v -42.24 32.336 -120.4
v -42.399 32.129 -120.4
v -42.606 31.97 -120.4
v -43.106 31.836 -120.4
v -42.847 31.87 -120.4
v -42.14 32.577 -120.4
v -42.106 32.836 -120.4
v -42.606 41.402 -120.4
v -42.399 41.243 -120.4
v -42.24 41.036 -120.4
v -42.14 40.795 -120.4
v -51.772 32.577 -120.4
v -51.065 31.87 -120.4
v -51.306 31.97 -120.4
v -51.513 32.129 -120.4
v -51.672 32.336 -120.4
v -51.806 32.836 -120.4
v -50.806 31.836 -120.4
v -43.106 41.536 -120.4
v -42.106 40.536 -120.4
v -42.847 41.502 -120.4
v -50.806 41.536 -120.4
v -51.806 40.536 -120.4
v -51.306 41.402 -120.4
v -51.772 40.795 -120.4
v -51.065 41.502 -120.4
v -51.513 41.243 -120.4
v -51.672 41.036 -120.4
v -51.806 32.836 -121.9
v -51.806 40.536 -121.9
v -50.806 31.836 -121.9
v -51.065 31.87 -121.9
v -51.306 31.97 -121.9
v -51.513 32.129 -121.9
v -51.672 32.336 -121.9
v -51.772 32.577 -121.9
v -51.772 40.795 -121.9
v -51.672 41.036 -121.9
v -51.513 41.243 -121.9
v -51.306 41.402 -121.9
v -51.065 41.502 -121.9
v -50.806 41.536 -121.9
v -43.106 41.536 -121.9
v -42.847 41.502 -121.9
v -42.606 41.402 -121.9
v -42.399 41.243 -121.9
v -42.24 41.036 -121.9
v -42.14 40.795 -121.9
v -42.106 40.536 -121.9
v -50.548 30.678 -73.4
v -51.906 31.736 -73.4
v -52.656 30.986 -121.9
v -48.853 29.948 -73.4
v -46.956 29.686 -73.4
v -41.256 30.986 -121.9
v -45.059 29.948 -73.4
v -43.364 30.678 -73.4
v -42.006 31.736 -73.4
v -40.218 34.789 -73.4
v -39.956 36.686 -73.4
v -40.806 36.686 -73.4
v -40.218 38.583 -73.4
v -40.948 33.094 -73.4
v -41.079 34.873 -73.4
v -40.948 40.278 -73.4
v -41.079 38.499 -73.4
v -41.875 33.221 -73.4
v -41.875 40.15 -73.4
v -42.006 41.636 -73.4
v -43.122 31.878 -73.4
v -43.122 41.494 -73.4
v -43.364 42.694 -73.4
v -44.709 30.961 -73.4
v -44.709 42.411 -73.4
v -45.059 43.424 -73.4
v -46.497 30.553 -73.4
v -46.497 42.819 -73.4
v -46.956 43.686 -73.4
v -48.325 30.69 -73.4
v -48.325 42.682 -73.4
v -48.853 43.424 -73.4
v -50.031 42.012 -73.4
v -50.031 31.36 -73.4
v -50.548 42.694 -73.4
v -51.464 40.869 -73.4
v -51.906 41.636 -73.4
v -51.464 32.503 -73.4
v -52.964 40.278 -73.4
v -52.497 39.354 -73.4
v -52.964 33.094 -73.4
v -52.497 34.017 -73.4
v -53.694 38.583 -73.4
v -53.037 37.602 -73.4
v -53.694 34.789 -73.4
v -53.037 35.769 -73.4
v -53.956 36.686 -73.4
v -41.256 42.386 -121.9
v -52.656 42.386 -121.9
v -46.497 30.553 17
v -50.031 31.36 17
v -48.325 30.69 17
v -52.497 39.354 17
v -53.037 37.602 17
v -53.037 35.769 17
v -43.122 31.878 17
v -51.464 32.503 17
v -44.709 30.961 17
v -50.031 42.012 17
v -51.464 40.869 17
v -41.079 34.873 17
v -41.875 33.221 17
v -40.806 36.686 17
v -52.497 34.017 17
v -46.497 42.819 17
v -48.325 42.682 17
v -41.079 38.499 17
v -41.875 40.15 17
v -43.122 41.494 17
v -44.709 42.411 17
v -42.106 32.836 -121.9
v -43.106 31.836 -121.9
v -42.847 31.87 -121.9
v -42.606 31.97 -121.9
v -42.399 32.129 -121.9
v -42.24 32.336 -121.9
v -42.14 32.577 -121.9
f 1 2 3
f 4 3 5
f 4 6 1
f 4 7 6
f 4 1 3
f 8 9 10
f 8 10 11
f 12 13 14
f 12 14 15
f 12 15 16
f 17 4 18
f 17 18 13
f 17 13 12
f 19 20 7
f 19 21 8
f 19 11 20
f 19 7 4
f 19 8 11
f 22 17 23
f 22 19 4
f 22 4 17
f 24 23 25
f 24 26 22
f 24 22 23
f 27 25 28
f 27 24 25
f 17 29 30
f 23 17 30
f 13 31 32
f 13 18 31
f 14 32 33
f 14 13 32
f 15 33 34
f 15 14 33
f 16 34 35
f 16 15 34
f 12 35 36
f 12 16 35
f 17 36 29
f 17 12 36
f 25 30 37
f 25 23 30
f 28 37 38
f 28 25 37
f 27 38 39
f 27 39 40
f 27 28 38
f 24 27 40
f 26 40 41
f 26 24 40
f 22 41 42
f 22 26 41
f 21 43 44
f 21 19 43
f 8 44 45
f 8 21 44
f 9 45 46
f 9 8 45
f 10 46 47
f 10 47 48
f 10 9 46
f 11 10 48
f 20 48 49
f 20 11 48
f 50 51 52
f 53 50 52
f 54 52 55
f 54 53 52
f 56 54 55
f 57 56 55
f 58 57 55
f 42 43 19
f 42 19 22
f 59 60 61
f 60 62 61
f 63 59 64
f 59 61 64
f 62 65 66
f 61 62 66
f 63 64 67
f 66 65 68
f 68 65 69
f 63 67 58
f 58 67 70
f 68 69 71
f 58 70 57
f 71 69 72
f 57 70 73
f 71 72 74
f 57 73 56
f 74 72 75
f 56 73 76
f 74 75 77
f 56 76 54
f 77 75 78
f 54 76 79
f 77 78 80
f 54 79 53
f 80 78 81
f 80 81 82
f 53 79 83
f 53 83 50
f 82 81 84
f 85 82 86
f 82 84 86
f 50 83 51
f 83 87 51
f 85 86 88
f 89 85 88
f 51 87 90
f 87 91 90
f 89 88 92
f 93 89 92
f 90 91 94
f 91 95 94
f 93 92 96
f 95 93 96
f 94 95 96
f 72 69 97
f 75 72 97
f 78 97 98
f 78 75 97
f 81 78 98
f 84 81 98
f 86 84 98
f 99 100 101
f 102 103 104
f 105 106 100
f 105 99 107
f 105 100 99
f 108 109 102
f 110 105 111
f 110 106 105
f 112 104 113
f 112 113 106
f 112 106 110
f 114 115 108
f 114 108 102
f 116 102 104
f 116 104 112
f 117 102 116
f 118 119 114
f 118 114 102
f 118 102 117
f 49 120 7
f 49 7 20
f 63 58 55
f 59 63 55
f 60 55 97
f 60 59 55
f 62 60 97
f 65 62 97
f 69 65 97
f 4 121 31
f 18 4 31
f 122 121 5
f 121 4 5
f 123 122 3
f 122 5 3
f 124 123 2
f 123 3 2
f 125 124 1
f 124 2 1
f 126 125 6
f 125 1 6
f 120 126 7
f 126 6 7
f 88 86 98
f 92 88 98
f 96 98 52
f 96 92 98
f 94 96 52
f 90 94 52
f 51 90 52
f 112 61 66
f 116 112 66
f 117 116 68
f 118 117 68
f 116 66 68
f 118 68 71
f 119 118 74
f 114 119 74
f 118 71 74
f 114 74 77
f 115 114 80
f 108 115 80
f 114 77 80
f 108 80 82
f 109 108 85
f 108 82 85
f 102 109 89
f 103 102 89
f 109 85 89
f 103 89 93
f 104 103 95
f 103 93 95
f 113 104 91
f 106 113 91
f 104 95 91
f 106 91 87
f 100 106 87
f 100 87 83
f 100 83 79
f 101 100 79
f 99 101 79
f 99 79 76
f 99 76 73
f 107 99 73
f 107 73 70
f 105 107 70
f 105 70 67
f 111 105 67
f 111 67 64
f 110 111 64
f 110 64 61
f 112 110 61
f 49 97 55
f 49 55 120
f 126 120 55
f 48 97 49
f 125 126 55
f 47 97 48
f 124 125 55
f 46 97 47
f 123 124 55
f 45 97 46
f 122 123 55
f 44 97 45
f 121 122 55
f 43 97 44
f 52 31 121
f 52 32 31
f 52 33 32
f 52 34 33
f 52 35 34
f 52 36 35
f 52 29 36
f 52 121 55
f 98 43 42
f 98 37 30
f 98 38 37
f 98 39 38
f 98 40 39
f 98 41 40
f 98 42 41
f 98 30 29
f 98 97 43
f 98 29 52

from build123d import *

# Parameters (mm, degrees)
SKETCH1_R           = 6.15
BOSS_EXTRUDE1_DEPTH = 17
BOSS_EXTRUDE2_START = -73.4
SKETCH1_2_R         = 6.15
BOSS_EXTRUDE2_DEPTH = 73.4
SKETCH4_W           = 9.7
SKETCH4_H           = 9.7
CUT_EXTRUDE1_DEPTH  = 1.5
FILLET1_R           = 1


with BuildPart() as part:
    # Sketch1 → Boss-Extrude1 (new body)
    with BuildSketch(Plane.XY):
        with Locations((-46.956139987, 36.685790659)):
            Circle(SKETCH1_R)
    extrude(amount=BOSS_EXTRUDE1_DEPTH)

    # Sketch1<2> → Boss-Extrude2 (add)
    with BuildSketch(Plane.XY.offset(BOSS_EXTRUDE2_START)):
        with Locations((-46.956139987, 36.685790659)):
            Circle(SKETCH1_2_R)
    extrude(amount=BOSS_EXTRUDE2_DEPTH)

    # Sketch3 → Loft1 section 0
    with BuildSketch(Plane(origin=(0, 0, -121.9), x_dir=(-1, 0, 0), z_dir=(0, 0, -1))):
        with BuildLine():
            Line((41.256139987, 42.385790659), (52.656139987, 42.385790659))
            Line((52.656139987, 42.385790659), (52.656139987, 30.985790659))
            Line((52.656139987, 30.985790659), (41.256139987, 30.985790659))
            Line((41.256139987, 30.985790659), (41.256139987, 42.385790659))
        make_face()
    # Sketch2 for Loft1 → Loft1 section 1
    with BuildSketch(Plane(origin=(0, 0, -73.4), x_dir=(-1, 0, 0), z_dir=(0, 0, -1))):
        with BuildLine():
            # circular arc as an exact rational Bezier (weights 1, cos(half-angle), 1)
            Bezier((42.006392519, 41.635538128), (46.956139988, 46.585285594), (51.905887456, 41.635538128), weights=[1, 0.707106781, 1])
            Bezier((51.905887456, 41.635538128), (56.855634922, 36.68579066), (51.905887456, 31.736043191), weights=[1, 0.707106781, 1])
            Bezier((51.905887456, 31.736043191), (46.956139987, 26.786295722), (42.006392519, 31.736043191), weights=[1, 0.707106781, 1])
            Bezier((42.006392519, 31.736043191), (37.05664505, 36.685790659), (42.006392519, 41.635538128), weights=[1, 0.707106781, 1])
        make_face()
    loft()

    # Sketch4 → Cut-Extrude1 (cut)
    with BuildSketch(Plane(origin=(0, 0, -121.9), x_dir=(-1, 0, 0), z_dir=(0, 0, -1))):
        with Locations((46.956139987, 36.685790659)):
            Rectangle(SKETCH4_W, SKETCH4_H)
    extrude(amount=-CUT_EXTRUDE1_DEPTH, mode=Mode.SUBTRACT)

    # Fillet1
    fillet1_edges = [part.edges().sort_by_distance(p)[0] for p in [
        (-51.806139987, 41.535790659, -121.15),
        (-51.806139987, 31.835790659, -121.15),
        (-42.106139987, 31.835790659, -121.15),
        (-42.106139987, 41.535790659, -121.15),
    ]]
    fillet(fillet1_edges, radius=FILLET1_R)


solid = part.part
